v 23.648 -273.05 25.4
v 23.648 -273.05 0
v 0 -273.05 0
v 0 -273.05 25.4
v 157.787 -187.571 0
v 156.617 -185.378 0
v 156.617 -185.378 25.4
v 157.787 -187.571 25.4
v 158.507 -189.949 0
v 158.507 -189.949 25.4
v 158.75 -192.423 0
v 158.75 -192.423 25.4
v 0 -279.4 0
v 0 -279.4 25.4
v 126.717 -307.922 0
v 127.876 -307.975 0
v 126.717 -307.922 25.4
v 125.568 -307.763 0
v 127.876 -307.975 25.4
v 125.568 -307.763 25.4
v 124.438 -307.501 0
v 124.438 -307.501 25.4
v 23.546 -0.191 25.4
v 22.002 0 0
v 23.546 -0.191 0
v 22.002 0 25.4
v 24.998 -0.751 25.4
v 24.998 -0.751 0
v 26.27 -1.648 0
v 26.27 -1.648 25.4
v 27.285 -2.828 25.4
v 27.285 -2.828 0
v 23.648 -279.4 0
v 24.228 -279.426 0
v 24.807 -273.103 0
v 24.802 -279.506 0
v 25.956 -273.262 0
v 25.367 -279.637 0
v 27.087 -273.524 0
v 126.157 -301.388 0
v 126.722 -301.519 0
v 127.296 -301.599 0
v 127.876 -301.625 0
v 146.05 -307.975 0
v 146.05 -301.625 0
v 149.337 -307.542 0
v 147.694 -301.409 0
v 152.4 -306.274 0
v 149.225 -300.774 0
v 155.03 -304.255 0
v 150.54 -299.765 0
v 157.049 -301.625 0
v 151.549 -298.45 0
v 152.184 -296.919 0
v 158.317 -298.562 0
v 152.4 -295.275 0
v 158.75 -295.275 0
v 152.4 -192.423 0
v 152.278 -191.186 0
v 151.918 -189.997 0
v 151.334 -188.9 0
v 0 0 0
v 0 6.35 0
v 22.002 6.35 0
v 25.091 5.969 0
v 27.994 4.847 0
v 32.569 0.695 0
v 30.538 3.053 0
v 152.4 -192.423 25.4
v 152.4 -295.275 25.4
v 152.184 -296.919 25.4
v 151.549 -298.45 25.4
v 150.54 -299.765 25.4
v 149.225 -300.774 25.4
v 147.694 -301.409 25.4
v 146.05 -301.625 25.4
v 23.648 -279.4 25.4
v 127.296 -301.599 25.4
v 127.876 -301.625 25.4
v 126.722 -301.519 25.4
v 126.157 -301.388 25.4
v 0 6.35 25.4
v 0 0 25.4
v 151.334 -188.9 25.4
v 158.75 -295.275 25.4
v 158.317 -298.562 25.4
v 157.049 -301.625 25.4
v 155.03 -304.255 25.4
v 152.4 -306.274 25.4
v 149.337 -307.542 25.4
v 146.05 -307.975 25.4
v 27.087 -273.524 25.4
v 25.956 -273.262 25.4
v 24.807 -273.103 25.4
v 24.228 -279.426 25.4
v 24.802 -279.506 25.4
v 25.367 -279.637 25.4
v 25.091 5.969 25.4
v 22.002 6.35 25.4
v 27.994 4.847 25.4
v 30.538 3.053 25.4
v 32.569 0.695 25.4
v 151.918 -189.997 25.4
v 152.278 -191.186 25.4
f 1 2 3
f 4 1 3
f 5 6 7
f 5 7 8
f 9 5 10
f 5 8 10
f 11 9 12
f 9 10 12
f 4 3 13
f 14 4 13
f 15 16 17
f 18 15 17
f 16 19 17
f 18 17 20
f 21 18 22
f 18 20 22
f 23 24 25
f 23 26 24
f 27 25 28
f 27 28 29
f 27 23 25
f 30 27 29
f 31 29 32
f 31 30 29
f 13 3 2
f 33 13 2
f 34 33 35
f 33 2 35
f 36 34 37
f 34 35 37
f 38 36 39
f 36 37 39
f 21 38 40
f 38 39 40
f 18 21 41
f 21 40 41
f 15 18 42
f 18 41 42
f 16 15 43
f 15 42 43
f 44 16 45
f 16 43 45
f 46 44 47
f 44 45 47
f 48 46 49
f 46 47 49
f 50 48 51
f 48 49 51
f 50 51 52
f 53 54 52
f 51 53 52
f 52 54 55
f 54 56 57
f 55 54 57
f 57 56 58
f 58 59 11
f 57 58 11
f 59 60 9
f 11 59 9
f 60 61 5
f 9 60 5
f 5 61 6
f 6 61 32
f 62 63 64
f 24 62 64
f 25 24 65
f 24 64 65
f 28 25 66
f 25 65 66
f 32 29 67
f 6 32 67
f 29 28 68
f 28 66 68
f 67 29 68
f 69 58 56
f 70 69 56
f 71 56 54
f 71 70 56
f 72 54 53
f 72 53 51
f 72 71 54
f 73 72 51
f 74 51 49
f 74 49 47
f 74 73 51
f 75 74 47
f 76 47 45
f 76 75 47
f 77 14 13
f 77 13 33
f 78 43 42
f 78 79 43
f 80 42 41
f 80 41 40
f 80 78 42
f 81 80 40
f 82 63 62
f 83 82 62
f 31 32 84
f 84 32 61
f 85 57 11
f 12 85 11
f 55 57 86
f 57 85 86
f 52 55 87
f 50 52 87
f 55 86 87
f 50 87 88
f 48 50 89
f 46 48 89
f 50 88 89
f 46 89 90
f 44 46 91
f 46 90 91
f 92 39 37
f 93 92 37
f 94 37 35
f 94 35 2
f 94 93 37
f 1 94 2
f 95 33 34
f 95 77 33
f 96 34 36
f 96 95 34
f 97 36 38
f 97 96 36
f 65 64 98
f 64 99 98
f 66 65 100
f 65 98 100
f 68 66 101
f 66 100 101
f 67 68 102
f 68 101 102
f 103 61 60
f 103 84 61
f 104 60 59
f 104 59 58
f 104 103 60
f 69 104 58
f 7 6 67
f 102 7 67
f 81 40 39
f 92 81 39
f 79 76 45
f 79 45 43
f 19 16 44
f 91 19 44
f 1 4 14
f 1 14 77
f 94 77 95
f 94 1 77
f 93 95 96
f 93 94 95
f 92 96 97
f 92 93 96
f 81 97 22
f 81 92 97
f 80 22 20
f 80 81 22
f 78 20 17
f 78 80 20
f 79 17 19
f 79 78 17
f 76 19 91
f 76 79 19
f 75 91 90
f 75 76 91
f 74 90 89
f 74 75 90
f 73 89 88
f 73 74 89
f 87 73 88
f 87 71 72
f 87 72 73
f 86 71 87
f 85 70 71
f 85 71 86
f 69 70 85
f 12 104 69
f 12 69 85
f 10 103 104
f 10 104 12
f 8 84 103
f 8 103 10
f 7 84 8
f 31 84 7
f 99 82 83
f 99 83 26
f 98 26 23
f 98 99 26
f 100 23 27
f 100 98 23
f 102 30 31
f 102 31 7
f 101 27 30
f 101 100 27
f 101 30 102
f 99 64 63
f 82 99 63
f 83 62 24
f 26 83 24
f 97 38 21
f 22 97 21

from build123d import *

# Parameters (mm, degrees)
EXTRUDE_THIN1_DEPTH = 25.4
FILLET1_R           = 6.35
FILLET2_R           = 12.7


with BuildPart() as part:
    # Sketch1 → Extrude-Thin1 (new body)
    with BuildSketch(Plane.XY):
        Polygon((0, 0), (25.4, 0), (152.4, -190.5), (152.4, -301.625), (127, -301.625), (25.4, -273.05), (0, -273.05), (0, -279.4), (24.52402436, -279.4), (126.12402436, -307.975), (158.75, -307.975), (158.75, -188.5773747), (28.798416866, 6.35), (0, 6.35), align=None)
    extrude(amount=EXTRUDE_THIN1_DEPTH)

    # Fillet1
    fillet1_edges = [part.edges().sort_by_distance(p)[0] for p in [
        (127, -301.625, 12.7),
        (152.4, -301.625, 12.7),
        (152.4, -190.5, 12.7),
        (25.4, 0, 12.7),
        (24.52402436, -279.4, 12.7),
    ]]
    fillet(fillet1_edges, radius=FILLET1_R)

    # Fillet2
    fillet2_edges = [part.edges().sort_by_distance(p)[0] for p in [
        (25.4, -273.05, 12.7),
        (28.798416866, 6.35, 12.7),
        (158.75, -188.5773747, 12.7),
        (158.75, -307.975, 12.7),
        (126.12402436, -307.975, 12.7),
    ]]
    fillet(fillet2_edges, radius=FILLET2_R)


solid = part.part
